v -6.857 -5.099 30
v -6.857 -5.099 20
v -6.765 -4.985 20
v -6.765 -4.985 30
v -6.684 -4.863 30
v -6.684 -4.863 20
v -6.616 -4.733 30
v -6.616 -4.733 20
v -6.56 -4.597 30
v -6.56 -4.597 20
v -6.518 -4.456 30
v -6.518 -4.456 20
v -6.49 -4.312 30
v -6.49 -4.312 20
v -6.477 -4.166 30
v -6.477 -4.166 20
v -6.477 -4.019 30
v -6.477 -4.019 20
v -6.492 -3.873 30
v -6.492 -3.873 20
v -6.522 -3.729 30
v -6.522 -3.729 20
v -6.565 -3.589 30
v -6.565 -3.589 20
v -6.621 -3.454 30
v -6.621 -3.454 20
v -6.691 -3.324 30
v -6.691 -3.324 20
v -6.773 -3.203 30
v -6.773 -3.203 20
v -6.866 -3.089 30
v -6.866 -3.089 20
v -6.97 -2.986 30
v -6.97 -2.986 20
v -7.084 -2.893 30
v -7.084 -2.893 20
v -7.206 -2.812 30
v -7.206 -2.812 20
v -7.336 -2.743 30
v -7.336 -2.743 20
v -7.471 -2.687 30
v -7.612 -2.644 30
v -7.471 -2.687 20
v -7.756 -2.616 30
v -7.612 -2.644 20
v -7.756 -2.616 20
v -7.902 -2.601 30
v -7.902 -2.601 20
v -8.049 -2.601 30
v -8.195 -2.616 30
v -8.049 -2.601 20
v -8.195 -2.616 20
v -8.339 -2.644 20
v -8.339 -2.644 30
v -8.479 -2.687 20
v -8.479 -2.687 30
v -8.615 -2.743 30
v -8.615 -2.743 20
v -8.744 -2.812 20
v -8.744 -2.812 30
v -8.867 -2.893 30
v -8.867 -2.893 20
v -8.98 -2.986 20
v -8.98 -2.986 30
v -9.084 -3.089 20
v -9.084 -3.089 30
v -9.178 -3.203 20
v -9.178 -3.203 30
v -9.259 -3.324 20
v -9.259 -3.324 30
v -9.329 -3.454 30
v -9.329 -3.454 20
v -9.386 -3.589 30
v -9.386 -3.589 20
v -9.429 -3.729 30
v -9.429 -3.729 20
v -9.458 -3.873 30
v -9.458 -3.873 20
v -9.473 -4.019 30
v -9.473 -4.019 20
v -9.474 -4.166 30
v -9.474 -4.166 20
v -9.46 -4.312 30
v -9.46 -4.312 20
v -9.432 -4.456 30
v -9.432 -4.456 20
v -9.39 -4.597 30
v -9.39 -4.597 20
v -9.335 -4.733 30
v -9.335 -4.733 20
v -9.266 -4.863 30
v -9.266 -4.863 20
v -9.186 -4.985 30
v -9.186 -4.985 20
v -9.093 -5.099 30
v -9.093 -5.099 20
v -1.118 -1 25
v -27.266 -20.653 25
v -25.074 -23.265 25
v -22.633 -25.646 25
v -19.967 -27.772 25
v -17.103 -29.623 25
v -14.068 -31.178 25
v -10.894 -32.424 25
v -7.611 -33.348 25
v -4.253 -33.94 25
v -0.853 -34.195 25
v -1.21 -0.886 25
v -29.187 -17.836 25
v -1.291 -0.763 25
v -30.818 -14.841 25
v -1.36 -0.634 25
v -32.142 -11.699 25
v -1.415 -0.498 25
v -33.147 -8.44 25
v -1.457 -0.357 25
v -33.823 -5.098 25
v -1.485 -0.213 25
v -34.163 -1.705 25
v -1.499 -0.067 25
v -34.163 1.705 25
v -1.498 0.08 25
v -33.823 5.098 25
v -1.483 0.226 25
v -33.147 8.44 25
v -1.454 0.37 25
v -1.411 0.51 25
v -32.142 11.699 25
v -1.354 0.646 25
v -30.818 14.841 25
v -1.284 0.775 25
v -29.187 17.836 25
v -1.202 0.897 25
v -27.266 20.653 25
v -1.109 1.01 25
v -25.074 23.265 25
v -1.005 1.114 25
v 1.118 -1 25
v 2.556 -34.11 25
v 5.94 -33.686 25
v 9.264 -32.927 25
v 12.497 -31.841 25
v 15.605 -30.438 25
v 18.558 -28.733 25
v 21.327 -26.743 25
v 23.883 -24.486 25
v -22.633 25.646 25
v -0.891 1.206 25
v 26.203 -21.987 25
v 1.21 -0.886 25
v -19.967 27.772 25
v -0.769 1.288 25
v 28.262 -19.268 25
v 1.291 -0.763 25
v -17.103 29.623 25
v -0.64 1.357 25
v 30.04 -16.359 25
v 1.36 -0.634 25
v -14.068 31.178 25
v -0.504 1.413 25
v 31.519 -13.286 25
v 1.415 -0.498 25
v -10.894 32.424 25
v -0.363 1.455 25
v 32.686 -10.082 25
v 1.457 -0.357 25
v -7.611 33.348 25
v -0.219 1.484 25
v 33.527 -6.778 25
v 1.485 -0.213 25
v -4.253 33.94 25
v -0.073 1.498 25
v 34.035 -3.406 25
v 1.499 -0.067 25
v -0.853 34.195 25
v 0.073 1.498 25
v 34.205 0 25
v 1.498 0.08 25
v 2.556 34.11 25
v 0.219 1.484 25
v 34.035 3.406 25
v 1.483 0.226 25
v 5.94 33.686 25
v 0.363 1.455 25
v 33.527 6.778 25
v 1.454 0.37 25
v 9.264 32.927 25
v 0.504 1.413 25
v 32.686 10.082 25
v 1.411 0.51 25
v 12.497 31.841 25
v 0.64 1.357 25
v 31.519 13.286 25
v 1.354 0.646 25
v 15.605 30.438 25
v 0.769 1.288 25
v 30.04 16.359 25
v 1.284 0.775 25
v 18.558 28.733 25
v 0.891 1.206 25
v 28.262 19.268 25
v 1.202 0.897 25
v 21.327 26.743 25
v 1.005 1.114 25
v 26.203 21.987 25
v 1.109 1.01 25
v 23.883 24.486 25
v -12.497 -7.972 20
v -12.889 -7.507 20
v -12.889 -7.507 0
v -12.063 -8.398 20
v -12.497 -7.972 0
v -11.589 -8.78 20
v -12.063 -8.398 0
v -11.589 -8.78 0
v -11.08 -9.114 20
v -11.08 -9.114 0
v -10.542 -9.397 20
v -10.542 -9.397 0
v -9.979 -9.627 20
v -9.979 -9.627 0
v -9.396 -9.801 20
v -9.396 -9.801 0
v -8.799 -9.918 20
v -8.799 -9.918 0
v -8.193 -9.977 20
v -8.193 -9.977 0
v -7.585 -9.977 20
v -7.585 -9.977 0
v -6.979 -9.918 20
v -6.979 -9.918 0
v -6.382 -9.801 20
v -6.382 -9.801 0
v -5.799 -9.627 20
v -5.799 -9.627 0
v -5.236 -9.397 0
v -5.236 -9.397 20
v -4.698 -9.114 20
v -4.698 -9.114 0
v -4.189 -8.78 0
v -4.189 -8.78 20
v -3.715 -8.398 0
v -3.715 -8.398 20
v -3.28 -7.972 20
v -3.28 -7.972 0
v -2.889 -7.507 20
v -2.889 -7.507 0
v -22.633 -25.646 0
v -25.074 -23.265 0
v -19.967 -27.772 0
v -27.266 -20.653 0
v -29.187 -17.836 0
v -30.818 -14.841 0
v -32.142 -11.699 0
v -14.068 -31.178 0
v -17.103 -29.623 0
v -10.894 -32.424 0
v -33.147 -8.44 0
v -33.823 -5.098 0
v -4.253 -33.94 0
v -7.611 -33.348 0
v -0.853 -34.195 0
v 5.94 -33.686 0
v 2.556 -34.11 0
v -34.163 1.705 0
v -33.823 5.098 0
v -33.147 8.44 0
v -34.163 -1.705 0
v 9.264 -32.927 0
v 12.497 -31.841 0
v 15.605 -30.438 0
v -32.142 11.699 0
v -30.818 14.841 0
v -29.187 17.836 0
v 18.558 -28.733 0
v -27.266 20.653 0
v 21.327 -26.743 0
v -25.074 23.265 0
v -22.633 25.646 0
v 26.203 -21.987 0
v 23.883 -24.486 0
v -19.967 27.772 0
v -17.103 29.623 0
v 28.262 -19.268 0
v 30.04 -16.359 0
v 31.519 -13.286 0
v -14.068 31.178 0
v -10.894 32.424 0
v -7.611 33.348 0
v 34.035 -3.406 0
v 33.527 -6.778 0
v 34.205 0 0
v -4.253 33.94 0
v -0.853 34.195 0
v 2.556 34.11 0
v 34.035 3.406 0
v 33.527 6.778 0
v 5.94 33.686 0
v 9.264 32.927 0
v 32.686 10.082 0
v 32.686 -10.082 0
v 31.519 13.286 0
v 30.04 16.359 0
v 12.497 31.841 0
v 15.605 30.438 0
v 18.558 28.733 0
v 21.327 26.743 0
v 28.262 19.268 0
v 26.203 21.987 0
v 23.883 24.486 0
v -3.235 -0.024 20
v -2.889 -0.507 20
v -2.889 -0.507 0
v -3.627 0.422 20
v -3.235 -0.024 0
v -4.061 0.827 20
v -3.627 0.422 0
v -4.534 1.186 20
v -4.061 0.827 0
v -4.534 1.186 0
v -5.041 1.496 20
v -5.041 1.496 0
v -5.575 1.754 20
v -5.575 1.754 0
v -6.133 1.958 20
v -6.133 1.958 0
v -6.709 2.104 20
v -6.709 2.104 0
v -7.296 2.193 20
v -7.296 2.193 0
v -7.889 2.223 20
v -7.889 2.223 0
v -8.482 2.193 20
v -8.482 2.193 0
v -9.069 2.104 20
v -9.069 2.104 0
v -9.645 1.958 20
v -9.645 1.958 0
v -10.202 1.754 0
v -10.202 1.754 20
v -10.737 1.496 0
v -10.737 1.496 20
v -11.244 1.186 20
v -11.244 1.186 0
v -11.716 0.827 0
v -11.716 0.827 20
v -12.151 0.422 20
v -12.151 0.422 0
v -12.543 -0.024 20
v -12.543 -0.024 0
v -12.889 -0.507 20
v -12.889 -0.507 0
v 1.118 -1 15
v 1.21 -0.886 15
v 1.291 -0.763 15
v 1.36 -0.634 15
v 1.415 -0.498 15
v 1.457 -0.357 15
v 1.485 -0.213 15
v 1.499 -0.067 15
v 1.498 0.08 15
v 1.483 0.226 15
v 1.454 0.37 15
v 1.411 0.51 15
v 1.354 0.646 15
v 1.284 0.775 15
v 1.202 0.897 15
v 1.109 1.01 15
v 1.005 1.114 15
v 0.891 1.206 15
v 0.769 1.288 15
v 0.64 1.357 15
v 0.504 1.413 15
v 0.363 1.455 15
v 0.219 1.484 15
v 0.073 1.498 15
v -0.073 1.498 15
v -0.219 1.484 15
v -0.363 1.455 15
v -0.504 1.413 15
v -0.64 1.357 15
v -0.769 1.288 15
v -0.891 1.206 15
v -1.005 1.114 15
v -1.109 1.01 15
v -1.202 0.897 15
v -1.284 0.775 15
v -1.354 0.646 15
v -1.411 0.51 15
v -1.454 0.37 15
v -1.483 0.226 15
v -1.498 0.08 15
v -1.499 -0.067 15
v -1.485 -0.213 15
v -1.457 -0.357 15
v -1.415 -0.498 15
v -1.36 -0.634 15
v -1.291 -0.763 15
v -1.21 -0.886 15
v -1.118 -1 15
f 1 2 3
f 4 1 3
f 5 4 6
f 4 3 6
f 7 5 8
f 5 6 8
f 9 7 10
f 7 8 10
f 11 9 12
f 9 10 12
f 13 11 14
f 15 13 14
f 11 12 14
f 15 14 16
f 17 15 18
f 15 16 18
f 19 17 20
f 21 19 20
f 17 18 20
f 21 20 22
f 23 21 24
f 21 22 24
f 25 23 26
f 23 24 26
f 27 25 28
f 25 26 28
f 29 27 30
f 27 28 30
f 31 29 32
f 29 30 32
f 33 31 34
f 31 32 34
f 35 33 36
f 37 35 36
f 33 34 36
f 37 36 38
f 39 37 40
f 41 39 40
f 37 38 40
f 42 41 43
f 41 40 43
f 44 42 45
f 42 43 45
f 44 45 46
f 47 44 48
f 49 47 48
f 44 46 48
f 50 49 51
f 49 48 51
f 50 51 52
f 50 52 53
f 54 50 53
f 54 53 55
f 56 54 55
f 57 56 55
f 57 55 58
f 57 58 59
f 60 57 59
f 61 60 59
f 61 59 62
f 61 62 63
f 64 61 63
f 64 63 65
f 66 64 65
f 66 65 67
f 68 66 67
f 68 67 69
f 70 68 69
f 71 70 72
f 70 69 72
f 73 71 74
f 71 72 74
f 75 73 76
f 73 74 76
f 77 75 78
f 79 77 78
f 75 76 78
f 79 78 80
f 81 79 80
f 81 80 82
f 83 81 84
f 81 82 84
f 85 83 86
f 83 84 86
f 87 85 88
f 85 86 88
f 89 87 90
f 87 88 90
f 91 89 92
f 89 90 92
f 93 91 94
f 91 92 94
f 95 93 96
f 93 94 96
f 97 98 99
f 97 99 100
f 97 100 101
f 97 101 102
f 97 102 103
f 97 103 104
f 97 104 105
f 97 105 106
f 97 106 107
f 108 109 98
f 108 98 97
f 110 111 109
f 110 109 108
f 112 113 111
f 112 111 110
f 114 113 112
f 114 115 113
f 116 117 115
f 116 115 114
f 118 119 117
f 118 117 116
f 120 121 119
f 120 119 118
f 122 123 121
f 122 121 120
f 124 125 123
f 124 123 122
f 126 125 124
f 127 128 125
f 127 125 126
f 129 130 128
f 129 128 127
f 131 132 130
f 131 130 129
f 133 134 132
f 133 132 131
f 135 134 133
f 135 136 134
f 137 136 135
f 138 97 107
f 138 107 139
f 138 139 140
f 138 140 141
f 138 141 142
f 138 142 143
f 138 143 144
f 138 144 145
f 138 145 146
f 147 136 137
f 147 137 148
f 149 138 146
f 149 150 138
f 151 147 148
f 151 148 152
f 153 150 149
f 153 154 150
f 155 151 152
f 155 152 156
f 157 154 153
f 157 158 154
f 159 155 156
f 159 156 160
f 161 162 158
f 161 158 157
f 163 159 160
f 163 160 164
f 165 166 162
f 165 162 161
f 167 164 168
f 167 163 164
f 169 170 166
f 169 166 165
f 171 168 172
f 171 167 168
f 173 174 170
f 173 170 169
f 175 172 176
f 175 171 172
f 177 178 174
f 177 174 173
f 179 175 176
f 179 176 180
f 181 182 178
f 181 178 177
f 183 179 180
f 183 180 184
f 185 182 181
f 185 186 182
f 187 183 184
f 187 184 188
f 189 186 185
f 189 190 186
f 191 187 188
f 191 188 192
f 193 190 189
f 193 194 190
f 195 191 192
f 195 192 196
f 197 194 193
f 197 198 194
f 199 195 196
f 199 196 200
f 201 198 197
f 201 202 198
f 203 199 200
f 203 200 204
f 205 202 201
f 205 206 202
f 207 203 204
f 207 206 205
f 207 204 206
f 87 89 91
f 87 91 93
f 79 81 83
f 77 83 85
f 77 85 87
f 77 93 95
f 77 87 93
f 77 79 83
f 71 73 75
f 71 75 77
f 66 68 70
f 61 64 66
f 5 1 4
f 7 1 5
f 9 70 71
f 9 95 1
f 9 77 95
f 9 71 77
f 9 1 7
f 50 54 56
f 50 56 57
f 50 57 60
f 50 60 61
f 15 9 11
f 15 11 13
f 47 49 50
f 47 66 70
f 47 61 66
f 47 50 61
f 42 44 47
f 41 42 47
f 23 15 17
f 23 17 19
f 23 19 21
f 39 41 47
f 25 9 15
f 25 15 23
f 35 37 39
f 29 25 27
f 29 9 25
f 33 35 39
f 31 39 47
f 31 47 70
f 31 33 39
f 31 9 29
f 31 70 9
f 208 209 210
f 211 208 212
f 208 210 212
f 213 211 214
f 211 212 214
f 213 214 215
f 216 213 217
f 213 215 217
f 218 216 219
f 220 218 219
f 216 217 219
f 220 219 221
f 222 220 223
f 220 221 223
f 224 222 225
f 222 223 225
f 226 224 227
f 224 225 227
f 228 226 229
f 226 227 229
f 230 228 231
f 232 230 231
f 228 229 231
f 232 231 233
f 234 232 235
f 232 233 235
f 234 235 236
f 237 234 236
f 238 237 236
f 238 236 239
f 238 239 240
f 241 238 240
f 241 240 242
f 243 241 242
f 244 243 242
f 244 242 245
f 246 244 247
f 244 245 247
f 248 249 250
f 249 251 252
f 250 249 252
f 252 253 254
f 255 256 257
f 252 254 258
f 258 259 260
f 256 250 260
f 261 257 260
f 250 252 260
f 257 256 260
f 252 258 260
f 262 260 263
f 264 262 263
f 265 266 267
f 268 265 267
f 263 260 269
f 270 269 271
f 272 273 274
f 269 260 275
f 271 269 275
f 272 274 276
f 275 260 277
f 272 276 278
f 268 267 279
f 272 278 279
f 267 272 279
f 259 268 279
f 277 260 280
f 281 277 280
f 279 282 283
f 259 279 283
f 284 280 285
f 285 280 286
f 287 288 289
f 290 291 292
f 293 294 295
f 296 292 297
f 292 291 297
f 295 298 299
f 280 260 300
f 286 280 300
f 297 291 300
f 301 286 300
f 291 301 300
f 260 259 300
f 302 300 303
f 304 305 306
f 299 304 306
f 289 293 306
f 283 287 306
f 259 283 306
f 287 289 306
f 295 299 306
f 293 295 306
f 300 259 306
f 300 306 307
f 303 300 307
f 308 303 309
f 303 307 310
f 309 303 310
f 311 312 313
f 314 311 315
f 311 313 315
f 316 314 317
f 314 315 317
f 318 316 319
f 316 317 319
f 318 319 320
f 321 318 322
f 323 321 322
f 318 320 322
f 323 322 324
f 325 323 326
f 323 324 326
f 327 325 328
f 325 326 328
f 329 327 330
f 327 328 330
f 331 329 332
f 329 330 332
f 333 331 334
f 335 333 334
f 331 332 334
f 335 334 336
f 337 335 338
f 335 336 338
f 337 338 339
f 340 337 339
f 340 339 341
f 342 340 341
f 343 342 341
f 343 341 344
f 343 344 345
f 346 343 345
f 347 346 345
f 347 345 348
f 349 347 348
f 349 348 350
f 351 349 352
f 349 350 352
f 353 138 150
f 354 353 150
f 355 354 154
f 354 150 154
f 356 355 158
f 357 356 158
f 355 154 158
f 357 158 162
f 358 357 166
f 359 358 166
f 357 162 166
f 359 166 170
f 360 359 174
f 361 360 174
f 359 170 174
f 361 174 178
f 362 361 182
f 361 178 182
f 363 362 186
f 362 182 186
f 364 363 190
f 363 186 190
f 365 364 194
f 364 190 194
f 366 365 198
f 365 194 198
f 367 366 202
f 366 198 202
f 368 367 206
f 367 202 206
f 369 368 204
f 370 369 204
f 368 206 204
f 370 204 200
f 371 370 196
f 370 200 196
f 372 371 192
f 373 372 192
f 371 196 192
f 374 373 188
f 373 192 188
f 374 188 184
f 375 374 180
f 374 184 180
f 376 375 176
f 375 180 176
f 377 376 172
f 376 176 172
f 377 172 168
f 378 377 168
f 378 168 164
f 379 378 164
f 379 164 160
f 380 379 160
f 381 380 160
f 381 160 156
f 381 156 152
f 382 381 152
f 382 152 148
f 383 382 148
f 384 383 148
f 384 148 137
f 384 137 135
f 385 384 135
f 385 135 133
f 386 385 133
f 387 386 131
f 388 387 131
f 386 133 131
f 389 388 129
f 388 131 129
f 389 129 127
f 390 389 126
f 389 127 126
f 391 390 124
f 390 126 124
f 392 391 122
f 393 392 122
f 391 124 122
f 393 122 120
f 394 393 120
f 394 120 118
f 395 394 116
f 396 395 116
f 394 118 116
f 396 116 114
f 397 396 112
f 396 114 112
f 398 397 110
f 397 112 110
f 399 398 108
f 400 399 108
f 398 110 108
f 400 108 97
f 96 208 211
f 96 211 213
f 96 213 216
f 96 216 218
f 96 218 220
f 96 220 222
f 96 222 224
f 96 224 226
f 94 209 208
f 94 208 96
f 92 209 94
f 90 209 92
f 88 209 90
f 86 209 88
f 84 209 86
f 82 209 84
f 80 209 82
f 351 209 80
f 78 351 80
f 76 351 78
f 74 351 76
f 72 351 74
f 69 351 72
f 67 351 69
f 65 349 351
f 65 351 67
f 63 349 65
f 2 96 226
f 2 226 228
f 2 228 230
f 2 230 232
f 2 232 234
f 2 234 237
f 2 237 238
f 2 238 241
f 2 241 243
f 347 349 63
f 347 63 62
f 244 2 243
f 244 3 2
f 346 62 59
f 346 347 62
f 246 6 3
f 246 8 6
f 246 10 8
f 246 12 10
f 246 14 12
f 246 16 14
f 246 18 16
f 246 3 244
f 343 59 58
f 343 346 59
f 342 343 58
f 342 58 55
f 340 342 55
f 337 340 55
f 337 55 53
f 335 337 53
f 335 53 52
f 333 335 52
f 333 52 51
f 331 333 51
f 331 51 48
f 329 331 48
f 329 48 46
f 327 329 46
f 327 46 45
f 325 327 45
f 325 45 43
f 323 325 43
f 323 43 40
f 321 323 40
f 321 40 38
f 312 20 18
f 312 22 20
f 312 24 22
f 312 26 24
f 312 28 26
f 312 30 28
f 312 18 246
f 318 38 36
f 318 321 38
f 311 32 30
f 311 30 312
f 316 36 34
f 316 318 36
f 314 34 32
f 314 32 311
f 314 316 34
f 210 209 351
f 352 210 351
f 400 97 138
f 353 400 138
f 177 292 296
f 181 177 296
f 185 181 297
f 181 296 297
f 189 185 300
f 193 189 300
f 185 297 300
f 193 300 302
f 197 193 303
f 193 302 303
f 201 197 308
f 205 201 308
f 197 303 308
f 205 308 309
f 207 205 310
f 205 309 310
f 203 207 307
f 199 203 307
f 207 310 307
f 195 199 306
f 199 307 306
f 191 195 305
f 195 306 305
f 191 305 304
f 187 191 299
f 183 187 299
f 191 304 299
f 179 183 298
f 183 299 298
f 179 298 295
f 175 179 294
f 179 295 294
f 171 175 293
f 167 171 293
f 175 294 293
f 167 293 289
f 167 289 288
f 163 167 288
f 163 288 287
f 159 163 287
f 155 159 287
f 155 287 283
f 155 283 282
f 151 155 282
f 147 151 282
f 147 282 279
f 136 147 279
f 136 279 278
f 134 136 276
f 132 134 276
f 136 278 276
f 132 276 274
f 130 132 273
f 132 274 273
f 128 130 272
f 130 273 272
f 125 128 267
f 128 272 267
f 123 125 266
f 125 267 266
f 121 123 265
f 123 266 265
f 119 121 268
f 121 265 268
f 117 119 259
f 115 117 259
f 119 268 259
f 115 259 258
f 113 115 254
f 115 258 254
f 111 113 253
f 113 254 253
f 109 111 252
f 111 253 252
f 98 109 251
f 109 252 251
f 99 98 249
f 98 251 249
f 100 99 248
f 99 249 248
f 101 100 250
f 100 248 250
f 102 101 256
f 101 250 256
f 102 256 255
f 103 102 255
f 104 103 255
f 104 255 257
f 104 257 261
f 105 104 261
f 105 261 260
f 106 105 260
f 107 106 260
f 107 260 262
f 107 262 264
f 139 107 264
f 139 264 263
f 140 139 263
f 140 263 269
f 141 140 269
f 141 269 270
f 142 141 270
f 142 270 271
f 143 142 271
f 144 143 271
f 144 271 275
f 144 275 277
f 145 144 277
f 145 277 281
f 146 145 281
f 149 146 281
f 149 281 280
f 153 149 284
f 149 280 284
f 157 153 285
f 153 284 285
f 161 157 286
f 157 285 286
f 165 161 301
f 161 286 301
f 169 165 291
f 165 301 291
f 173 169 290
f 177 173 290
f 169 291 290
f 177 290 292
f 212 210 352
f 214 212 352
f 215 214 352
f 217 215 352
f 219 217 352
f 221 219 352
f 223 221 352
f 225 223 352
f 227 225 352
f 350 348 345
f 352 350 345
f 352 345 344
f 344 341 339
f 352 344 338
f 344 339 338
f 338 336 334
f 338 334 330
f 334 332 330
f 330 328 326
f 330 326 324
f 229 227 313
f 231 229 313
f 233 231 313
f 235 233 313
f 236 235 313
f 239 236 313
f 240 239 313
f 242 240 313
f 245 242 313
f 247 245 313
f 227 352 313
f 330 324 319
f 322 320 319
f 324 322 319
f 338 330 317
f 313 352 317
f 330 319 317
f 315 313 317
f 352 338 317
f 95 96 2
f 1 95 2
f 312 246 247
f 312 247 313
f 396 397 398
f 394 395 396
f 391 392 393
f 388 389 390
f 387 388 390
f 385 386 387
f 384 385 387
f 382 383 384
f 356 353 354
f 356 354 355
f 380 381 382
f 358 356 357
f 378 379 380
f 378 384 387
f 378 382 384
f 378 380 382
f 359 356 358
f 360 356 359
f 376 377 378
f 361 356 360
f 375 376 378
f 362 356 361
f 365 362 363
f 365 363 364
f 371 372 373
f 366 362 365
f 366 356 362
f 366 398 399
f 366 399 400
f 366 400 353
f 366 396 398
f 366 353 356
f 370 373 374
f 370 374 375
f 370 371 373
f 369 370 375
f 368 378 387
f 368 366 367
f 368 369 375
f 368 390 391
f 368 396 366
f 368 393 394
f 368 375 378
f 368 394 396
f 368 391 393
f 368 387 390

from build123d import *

# Parameters (mm, degrees)
F0_R     = 34.2051900743
F1_DEPTH = 25
F3_DEPTH = 10
F4_W     = 10
F4_H     = 7
F5_DEPTH = 20
F7_DEPTH = 10


with BuildPart() as f1:
    # F0 (on Top) → F1 (new body)
    with BuildSketch(Plane.XY):
        Circle(F0_R)
    extrude(amount=F1_DEPTH)

    # F2 (on face) → F3 (cut)
    with BuildSketch(Plane.XY.offset(25)):
        with BuildLine():
            Line((0, -1), (1.1180339887, -1))
            ThreePointArc((1.1180339887, -1), (0, 1.5), (-1.1180339887, -1))
            Line((-1.1180339887, -1), (0, -1))
        make_face()
    extrude(amount=-F3_DEPTH, mode=Mode.SUBTRACT)


with BuildPart() as f5:
    # F4 (on Top) → F5 (new body)
    with BuildSketch(Plane.XY):
        with Locations((-7.8889451153, -4.0067454018)):
            Rectangle(F4_W, F4_H)
        with BuildLine():
            Line((-12.8889451153, -0.5067454018), (-2.8889451153, -0.5067454018))
            ThreePointArc((-2.8889451153, -0.5067454018), (-7.8889451153, 2.2227708057), (-12.8889451153, -0.5067454018))
        make_face()
        with BuildLine():
            ThreePointArc((-12.8889451153, -7.5067454018), (-7.8889451153, -9.9842291943), (-2.8889451153, -7.5067454018))
            Line((-2.8889451153, -7.5067454018), (-12.8889451153, -7.5067454018))
        make_face()
    extrude(amount=F5_DEPTH)

    # F6 (on face) → F7 (join)
    with BuildSketch(Plane.XY.offset(20)):
        with BuildLine():
            Line((-7.9751741141, -5.0994232297), (-6.8571401254, -5.0994232297))
            ThreePointArc((-6.8571401254, -5.0994232297), (-7.9751741141, -2.5994232297), (-9.0932081029, -5.0994232297))
            Line((-9.0932081029, -5.0994232297), (-7.9751741141, -5.0994232297))
        make_face()
    extrude(amount=F7_DEPTH)


solid = Compound([f1.part, f5.part])
